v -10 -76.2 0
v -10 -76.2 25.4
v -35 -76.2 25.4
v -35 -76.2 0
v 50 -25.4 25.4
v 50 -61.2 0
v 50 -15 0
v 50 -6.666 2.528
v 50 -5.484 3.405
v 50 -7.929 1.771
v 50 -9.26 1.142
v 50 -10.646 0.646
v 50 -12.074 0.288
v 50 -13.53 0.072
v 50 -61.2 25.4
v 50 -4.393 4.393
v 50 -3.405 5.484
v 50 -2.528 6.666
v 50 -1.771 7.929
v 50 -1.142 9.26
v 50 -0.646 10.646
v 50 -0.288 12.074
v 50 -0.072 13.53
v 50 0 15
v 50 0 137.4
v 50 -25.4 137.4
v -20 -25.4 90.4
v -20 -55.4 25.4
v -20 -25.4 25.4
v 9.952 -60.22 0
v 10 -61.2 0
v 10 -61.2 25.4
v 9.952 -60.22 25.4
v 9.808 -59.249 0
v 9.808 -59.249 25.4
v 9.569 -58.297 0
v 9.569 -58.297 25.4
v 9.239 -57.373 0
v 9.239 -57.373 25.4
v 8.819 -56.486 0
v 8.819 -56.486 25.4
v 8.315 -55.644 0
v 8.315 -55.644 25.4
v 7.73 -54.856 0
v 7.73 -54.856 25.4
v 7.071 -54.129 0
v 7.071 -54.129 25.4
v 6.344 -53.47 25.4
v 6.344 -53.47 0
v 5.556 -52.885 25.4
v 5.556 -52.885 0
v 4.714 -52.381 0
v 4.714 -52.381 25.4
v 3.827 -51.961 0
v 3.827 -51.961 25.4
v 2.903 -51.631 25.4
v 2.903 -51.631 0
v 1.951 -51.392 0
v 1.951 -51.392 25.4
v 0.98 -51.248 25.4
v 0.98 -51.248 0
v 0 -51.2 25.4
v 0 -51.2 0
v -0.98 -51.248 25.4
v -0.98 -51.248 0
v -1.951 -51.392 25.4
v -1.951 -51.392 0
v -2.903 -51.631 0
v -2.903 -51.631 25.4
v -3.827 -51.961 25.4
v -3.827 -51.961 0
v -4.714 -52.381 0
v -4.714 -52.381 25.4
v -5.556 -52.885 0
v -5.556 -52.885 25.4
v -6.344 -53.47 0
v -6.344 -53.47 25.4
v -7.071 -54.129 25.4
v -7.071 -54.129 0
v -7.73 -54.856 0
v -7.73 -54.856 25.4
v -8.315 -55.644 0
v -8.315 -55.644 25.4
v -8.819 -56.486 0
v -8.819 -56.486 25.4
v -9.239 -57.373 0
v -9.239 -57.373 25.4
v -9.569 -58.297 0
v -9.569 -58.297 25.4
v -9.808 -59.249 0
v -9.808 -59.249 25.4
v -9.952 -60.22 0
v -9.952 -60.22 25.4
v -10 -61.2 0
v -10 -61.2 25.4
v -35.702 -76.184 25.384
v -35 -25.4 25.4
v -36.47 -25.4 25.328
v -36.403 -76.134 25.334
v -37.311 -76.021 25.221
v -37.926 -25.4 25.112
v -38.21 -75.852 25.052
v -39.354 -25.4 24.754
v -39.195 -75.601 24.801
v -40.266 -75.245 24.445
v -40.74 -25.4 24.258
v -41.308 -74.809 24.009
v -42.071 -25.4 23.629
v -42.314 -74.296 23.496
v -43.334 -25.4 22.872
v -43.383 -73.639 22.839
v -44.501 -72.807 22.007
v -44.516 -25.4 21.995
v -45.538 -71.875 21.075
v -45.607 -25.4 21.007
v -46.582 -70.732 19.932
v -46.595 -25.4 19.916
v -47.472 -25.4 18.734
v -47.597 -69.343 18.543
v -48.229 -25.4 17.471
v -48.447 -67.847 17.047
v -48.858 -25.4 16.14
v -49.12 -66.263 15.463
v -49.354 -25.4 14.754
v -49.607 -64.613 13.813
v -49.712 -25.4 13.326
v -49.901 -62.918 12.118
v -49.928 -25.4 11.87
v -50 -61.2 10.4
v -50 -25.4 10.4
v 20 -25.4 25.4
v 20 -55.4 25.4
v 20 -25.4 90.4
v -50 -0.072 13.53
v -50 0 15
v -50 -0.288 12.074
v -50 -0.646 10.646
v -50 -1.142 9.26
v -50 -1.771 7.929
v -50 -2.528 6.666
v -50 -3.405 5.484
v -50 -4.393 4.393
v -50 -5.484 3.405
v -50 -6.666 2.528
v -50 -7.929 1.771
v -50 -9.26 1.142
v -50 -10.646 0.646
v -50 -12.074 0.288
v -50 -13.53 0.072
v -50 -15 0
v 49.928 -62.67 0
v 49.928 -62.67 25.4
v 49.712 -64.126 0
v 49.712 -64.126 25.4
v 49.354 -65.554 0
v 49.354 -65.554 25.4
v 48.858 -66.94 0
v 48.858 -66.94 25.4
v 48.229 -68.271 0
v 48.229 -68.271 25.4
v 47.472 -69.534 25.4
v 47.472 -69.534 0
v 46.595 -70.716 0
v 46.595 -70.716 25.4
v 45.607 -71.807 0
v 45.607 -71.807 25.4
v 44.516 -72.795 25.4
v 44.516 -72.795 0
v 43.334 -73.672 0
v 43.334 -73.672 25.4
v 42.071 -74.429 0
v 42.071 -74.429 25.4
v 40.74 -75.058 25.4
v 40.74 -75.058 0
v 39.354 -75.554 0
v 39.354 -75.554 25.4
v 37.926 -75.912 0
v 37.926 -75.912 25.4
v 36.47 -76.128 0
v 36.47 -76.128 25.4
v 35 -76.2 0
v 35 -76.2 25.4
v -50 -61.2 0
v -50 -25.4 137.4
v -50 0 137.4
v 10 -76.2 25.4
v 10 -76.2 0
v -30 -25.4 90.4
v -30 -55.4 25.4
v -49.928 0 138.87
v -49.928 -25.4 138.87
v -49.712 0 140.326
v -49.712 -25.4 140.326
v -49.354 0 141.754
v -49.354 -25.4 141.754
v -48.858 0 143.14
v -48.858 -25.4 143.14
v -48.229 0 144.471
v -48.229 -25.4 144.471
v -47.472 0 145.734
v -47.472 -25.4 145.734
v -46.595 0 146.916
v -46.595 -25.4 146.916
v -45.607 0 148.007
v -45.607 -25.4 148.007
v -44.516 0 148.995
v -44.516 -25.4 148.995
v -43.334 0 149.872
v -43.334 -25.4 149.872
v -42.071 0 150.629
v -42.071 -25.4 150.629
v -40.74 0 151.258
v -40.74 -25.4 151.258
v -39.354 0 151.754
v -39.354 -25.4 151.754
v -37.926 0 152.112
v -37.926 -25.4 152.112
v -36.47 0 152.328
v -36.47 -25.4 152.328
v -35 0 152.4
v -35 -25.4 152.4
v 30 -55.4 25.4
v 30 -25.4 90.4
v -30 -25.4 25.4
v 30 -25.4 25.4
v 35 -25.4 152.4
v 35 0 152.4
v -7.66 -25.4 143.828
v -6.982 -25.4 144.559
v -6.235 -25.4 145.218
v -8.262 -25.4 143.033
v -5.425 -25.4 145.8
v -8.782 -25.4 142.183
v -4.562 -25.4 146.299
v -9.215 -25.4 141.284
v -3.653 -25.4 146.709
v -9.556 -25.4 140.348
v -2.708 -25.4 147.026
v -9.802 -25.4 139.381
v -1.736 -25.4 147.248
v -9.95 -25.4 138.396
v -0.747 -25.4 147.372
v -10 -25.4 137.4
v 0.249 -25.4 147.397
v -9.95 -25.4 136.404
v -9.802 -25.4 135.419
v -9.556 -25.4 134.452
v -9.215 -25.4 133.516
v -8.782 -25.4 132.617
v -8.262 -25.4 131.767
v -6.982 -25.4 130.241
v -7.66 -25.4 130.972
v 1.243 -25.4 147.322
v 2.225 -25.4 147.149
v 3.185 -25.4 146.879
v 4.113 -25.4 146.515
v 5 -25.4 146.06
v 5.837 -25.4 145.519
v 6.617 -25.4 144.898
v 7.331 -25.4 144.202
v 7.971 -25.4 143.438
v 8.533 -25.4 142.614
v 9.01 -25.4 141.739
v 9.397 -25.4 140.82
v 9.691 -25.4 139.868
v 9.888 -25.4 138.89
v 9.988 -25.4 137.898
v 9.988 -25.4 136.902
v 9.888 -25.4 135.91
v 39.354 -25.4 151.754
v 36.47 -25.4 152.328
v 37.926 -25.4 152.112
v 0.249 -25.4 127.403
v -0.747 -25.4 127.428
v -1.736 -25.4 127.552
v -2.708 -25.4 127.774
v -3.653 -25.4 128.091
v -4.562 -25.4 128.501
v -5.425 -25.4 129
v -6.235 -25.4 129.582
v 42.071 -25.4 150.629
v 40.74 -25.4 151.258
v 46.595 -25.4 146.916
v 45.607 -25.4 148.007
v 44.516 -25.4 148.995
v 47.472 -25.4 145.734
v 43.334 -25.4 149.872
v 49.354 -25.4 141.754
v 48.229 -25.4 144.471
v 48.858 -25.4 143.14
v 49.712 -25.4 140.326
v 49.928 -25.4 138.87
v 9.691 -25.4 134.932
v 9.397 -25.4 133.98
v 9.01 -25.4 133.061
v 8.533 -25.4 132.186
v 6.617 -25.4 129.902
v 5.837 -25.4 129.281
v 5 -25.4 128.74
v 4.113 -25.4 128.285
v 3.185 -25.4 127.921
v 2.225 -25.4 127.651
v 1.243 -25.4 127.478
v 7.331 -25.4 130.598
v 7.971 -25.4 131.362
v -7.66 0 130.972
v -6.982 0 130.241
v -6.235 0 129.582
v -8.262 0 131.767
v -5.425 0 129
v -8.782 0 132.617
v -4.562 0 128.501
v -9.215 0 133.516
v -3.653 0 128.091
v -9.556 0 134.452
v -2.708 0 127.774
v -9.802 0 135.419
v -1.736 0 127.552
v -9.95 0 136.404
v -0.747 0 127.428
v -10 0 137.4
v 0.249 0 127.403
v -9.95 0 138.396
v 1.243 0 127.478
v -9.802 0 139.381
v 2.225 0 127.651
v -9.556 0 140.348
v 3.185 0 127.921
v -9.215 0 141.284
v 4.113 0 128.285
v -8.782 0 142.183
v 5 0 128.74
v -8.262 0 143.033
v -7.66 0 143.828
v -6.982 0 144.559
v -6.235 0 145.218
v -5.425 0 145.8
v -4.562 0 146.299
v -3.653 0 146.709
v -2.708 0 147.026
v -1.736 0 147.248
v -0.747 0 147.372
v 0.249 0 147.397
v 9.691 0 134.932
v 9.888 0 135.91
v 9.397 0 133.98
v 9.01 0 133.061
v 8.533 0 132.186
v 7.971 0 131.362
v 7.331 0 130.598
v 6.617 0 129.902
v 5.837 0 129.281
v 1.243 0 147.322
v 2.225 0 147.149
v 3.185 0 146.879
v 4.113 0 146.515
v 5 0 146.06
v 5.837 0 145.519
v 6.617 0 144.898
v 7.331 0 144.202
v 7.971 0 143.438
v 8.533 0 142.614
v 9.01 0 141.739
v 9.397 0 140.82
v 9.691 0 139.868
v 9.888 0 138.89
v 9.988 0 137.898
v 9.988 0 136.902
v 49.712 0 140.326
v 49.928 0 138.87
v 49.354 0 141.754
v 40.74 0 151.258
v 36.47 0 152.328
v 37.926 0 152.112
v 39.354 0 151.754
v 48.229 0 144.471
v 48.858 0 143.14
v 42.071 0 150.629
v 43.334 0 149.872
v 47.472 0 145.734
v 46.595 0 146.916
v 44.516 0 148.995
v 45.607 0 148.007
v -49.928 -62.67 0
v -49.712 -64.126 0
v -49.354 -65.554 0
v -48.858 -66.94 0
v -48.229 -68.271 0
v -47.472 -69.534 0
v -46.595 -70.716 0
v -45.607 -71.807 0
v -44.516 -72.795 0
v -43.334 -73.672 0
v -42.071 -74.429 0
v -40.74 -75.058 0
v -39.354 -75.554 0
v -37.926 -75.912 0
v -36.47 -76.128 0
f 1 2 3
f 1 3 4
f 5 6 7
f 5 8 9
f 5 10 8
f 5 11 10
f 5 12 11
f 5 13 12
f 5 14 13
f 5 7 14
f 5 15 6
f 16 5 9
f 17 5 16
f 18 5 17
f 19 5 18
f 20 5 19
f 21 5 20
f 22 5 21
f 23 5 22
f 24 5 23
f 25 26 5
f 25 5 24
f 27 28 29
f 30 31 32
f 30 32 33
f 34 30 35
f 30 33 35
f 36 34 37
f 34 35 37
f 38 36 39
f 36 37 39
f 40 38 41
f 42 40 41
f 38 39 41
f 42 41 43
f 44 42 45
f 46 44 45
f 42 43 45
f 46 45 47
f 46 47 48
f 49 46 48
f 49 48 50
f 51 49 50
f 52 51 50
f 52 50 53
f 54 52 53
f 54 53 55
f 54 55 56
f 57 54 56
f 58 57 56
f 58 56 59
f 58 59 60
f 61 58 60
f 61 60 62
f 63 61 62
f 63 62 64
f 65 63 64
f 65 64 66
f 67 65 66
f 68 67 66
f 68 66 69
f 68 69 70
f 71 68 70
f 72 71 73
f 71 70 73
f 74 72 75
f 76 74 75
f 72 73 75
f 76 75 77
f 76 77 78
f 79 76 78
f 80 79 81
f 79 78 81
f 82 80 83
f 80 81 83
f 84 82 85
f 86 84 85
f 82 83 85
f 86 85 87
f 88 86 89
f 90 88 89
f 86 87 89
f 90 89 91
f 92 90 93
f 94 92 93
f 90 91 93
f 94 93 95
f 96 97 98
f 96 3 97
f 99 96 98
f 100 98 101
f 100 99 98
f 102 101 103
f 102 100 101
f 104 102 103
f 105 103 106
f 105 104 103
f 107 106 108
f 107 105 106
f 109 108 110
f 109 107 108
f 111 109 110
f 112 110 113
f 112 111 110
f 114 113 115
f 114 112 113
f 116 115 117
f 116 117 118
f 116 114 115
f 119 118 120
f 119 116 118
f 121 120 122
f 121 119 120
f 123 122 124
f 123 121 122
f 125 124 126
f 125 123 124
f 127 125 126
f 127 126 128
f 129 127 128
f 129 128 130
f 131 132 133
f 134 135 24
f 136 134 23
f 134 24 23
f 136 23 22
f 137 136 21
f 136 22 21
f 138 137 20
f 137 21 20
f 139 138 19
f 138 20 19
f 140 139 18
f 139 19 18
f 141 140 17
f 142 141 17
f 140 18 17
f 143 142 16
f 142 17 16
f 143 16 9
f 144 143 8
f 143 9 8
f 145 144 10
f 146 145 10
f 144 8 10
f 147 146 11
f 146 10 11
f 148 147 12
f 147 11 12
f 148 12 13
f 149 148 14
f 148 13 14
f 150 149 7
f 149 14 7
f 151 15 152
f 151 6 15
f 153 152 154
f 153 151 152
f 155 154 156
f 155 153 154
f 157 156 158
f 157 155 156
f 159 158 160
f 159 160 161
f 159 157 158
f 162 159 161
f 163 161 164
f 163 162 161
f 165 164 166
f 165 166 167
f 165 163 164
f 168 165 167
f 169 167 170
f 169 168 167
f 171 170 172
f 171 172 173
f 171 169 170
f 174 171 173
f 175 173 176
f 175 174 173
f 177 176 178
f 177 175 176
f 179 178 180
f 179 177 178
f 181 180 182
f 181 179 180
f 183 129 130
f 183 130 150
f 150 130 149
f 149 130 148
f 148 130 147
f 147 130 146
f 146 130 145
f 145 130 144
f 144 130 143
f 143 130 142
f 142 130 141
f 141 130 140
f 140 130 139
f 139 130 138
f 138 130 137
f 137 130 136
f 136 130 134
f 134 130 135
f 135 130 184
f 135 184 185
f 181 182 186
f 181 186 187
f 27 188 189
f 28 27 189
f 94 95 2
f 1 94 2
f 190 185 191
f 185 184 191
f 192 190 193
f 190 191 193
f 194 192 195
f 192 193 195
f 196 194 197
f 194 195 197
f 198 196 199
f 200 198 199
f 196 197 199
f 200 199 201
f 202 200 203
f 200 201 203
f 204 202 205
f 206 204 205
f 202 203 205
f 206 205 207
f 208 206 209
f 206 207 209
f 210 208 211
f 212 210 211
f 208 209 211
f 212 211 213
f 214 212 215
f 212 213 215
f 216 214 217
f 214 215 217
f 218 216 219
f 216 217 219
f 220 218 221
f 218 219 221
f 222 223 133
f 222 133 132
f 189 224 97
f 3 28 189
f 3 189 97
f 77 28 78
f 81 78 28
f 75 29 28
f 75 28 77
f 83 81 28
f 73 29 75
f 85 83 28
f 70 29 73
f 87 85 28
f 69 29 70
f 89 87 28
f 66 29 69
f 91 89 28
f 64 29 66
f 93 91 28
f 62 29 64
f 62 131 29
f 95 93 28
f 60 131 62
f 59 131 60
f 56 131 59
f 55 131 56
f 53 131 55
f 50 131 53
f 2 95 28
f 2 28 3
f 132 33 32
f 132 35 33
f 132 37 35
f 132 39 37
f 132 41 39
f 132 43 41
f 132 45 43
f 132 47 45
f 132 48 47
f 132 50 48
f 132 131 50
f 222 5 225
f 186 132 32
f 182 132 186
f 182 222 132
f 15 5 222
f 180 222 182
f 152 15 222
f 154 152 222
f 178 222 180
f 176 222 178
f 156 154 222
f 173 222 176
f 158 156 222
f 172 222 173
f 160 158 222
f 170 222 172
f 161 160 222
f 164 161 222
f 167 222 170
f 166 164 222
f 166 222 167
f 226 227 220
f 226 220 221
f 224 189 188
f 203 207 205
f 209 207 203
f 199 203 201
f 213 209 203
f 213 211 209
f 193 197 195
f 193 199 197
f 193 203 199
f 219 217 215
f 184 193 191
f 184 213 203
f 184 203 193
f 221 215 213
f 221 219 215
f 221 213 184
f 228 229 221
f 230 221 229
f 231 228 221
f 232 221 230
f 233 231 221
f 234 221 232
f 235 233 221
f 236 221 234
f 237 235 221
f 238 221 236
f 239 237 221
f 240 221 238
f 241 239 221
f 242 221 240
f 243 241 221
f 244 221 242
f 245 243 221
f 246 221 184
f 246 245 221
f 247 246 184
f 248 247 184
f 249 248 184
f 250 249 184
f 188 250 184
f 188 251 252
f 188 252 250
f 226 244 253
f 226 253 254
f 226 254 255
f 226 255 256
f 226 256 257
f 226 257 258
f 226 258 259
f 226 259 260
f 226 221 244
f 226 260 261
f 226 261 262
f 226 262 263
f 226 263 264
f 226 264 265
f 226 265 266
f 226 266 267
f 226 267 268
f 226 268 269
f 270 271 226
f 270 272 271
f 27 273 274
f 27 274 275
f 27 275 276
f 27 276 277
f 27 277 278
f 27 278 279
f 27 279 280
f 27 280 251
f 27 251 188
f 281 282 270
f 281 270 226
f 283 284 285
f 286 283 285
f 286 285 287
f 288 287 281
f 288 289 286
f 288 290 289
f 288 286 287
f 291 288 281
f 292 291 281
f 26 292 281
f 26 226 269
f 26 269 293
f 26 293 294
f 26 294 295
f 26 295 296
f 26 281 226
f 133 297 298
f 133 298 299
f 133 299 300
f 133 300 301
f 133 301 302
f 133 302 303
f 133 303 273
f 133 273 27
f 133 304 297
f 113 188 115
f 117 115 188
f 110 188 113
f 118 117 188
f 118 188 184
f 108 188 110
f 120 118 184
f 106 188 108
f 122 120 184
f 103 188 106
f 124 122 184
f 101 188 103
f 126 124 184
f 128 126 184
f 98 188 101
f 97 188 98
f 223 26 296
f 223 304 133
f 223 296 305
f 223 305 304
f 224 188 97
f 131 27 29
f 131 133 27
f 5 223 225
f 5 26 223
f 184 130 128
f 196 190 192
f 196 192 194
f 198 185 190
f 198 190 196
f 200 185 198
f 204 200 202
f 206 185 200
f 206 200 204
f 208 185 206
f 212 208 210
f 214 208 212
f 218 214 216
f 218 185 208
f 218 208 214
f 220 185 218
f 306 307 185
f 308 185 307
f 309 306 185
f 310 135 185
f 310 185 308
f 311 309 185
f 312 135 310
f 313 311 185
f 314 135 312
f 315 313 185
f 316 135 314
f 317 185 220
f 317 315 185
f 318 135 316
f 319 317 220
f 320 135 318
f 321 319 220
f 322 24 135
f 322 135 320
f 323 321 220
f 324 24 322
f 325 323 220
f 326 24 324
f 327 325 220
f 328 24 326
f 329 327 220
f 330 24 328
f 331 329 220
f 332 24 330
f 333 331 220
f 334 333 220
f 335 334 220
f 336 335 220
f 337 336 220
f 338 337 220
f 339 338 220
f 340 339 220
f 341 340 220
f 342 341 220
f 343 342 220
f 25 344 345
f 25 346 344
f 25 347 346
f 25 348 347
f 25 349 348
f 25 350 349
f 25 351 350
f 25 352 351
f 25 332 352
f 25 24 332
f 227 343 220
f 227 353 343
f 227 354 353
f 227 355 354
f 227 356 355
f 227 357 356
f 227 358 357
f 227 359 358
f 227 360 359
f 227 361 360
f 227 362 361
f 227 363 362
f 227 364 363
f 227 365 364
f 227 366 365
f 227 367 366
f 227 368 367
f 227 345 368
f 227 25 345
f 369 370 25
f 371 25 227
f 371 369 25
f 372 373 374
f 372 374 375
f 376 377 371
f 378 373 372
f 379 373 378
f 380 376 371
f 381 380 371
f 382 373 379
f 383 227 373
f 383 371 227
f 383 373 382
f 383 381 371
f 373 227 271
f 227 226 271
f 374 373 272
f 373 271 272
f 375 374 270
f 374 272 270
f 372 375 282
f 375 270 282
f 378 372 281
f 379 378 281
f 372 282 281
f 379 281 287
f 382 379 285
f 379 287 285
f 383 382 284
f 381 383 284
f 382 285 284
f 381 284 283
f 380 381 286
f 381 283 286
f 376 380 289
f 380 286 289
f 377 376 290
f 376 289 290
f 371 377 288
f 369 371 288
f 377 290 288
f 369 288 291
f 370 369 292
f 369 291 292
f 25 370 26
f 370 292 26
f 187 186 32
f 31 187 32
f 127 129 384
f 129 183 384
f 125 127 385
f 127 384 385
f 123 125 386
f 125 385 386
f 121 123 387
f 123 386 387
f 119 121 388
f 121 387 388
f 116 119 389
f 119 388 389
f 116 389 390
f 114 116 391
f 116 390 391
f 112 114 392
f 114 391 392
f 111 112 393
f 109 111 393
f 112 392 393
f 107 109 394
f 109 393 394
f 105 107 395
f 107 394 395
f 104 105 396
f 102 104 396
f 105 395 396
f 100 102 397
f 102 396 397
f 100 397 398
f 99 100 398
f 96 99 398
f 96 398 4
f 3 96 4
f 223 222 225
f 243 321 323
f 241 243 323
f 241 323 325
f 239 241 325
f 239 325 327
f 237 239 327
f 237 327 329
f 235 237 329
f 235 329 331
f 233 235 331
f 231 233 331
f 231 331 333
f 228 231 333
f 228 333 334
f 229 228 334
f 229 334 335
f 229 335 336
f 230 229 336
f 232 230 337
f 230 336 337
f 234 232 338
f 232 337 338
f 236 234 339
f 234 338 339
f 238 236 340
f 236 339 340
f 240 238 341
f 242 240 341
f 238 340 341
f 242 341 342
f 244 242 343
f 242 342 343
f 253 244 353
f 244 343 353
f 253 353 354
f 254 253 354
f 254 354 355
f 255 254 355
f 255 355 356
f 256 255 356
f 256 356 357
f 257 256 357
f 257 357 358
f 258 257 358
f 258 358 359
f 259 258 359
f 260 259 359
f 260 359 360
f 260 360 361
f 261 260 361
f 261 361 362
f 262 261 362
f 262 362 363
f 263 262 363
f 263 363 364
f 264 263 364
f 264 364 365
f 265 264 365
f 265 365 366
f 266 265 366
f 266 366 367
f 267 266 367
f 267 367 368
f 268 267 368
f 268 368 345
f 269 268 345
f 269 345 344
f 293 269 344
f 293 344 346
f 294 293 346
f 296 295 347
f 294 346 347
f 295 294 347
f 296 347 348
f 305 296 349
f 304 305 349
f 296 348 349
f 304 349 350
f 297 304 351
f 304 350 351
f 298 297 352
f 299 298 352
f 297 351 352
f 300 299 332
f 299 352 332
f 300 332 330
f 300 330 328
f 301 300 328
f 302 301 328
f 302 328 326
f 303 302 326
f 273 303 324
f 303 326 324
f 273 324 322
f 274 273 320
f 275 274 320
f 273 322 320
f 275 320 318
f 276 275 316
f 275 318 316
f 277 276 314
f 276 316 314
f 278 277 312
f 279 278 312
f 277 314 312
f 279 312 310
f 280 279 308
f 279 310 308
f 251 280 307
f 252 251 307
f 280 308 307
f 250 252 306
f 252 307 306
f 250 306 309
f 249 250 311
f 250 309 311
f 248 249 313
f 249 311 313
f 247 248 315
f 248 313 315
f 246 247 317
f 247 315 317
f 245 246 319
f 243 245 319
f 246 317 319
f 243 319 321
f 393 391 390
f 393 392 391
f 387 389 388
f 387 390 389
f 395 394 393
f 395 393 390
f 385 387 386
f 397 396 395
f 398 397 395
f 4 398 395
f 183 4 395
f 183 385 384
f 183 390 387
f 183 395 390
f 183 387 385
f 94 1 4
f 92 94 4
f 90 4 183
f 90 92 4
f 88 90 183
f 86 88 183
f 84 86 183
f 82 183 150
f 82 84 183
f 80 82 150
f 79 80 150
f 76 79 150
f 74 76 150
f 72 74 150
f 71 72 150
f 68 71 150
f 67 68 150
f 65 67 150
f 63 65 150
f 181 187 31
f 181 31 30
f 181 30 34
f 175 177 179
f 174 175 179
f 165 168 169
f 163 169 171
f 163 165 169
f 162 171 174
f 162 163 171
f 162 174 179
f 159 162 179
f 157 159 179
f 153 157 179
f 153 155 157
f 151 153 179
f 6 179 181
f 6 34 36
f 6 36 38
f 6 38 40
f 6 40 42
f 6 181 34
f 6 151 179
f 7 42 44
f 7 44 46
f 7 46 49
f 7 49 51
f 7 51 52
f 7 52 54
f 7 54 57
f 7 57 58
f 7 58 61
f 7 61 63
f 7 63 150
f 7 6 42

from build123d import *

# Parameters (mm, degrees)
F1_DEPTH = 50
F4_DEPTH = 25.401
F2_R     = 10
F5_DEPTH = 76.201
F8_DEPTH = 5
F11_R    = 15


# Not quite as in the source:
# - a feature of the source that left no trace in its solid (it failed there, or was rolled back) is left out
# - a pattern or mirror of a feature is missing from the dataset's text; its kind, count and spacing are read off the source's solid


with BuildPart() as f1:
    # F0 (on Right) → F1 (new body, symmetric)
    with BuildSketch(Plane.YZ):
        Polygon((-76.2, 0), (0, 0), (0, 152.4), (-25.4, 152.4), (-25.4, 25.4), (-76.2, 25.4), align=None)
    extrude(amount=F1_DEPTH, both=True)

    # F3 (on face) → F4 (cut, through all)
    with BuildSketch(Plane.XY.offset(25.4)):
        with BuildLine():
            ThreePointArc((-10, -61.2), (0, -71.2), (10, -61.2))
            ThreePointArc((10, -61.2), (0, -51.2), (-10, -61.2))
        make_face()
        with BuildLine():
            Line((10, -76.2), (10, -61.2))
            ThreePointArc((10, -61.2), (0, -71.2), (-10, -61.2))
            Line((-10, -61.2), (-10, -76.2))
            Line((-10, -76.2), (10, -76.2))
        make_face()
    extrude(amount=-F4_DEPTH, mode=Mode.SUBTRACT)

    # F2 (on face) → F5 (cut, through all)
    with BuildSketch(Plane(origin=(0, 0, 0), x_dir=(-1, 0, 0), z_dir=(0, 1, 0))):
        with Locations((0, 137.4)):
            Circle(F2_R)
    extrude(amount=-F5_DEPTH, mode=Mode.SUBTRACT)

    # F7 (on offset) → F8 (join, symmetric)
    with BuildSketch(Plane.YZ.offset(25)):
        Polygon((-25.4, 25.4), (-25.4, 90.4), (-55.4, 25.4), align=None)
    f8 = extrude(amount=F8_DEPTH, both=True)

    # F8_copies: F8 across plane
    add(f8.mirror(Plane(origin=(0, 0, 0), x_dir=(0, 0, -1), z_dir=(-1, 0, 0))))

    # F11 (call 1 of 5: OpenCascade refuses the feature's edges together)
    f11_edges = [f1.edges().sort_by_distance(p)[0] for p in [
        (-50, -12.7, 152.4),
    ]]
    fillet(f11_edges, radius=F11_R)

    # F11#2 (call 2 of 5)
    f11_2_edges = [f1.edges().sort_by_distance(p)[0] for p in [
        (50, -12.7, 152.4),
    ]]
    fillet(f11_2_edges, radius=F11_R)

    # F11#3 (call 3 of 5)
    f11_3_edges = [f1.edges().sort_by_distance(p)[0] for p in [
        (0, 0, 0),
    ]]
    fillet(f11_3_edges, radius=F11_R)

    # F11#4 (call 4 of 5)
    f11_4_edges = [f1.edges().sort_by_distance(p)[0] for p in [
        (50, -76.2, 12.7),
    ]]
    fillet(f11_4_edges, radius=F11_R)

    # F11#5 (call 5 of 5)
    f11_5_edges = [f1.edges().sort_by_distance(p)[0] for p in [
        (-50, -76.2, 12.7),
        (-50, -50.8, 25.4),
    ]]
    fillet(f11_5_edges, radius=F11_R)


solid = f1.part
